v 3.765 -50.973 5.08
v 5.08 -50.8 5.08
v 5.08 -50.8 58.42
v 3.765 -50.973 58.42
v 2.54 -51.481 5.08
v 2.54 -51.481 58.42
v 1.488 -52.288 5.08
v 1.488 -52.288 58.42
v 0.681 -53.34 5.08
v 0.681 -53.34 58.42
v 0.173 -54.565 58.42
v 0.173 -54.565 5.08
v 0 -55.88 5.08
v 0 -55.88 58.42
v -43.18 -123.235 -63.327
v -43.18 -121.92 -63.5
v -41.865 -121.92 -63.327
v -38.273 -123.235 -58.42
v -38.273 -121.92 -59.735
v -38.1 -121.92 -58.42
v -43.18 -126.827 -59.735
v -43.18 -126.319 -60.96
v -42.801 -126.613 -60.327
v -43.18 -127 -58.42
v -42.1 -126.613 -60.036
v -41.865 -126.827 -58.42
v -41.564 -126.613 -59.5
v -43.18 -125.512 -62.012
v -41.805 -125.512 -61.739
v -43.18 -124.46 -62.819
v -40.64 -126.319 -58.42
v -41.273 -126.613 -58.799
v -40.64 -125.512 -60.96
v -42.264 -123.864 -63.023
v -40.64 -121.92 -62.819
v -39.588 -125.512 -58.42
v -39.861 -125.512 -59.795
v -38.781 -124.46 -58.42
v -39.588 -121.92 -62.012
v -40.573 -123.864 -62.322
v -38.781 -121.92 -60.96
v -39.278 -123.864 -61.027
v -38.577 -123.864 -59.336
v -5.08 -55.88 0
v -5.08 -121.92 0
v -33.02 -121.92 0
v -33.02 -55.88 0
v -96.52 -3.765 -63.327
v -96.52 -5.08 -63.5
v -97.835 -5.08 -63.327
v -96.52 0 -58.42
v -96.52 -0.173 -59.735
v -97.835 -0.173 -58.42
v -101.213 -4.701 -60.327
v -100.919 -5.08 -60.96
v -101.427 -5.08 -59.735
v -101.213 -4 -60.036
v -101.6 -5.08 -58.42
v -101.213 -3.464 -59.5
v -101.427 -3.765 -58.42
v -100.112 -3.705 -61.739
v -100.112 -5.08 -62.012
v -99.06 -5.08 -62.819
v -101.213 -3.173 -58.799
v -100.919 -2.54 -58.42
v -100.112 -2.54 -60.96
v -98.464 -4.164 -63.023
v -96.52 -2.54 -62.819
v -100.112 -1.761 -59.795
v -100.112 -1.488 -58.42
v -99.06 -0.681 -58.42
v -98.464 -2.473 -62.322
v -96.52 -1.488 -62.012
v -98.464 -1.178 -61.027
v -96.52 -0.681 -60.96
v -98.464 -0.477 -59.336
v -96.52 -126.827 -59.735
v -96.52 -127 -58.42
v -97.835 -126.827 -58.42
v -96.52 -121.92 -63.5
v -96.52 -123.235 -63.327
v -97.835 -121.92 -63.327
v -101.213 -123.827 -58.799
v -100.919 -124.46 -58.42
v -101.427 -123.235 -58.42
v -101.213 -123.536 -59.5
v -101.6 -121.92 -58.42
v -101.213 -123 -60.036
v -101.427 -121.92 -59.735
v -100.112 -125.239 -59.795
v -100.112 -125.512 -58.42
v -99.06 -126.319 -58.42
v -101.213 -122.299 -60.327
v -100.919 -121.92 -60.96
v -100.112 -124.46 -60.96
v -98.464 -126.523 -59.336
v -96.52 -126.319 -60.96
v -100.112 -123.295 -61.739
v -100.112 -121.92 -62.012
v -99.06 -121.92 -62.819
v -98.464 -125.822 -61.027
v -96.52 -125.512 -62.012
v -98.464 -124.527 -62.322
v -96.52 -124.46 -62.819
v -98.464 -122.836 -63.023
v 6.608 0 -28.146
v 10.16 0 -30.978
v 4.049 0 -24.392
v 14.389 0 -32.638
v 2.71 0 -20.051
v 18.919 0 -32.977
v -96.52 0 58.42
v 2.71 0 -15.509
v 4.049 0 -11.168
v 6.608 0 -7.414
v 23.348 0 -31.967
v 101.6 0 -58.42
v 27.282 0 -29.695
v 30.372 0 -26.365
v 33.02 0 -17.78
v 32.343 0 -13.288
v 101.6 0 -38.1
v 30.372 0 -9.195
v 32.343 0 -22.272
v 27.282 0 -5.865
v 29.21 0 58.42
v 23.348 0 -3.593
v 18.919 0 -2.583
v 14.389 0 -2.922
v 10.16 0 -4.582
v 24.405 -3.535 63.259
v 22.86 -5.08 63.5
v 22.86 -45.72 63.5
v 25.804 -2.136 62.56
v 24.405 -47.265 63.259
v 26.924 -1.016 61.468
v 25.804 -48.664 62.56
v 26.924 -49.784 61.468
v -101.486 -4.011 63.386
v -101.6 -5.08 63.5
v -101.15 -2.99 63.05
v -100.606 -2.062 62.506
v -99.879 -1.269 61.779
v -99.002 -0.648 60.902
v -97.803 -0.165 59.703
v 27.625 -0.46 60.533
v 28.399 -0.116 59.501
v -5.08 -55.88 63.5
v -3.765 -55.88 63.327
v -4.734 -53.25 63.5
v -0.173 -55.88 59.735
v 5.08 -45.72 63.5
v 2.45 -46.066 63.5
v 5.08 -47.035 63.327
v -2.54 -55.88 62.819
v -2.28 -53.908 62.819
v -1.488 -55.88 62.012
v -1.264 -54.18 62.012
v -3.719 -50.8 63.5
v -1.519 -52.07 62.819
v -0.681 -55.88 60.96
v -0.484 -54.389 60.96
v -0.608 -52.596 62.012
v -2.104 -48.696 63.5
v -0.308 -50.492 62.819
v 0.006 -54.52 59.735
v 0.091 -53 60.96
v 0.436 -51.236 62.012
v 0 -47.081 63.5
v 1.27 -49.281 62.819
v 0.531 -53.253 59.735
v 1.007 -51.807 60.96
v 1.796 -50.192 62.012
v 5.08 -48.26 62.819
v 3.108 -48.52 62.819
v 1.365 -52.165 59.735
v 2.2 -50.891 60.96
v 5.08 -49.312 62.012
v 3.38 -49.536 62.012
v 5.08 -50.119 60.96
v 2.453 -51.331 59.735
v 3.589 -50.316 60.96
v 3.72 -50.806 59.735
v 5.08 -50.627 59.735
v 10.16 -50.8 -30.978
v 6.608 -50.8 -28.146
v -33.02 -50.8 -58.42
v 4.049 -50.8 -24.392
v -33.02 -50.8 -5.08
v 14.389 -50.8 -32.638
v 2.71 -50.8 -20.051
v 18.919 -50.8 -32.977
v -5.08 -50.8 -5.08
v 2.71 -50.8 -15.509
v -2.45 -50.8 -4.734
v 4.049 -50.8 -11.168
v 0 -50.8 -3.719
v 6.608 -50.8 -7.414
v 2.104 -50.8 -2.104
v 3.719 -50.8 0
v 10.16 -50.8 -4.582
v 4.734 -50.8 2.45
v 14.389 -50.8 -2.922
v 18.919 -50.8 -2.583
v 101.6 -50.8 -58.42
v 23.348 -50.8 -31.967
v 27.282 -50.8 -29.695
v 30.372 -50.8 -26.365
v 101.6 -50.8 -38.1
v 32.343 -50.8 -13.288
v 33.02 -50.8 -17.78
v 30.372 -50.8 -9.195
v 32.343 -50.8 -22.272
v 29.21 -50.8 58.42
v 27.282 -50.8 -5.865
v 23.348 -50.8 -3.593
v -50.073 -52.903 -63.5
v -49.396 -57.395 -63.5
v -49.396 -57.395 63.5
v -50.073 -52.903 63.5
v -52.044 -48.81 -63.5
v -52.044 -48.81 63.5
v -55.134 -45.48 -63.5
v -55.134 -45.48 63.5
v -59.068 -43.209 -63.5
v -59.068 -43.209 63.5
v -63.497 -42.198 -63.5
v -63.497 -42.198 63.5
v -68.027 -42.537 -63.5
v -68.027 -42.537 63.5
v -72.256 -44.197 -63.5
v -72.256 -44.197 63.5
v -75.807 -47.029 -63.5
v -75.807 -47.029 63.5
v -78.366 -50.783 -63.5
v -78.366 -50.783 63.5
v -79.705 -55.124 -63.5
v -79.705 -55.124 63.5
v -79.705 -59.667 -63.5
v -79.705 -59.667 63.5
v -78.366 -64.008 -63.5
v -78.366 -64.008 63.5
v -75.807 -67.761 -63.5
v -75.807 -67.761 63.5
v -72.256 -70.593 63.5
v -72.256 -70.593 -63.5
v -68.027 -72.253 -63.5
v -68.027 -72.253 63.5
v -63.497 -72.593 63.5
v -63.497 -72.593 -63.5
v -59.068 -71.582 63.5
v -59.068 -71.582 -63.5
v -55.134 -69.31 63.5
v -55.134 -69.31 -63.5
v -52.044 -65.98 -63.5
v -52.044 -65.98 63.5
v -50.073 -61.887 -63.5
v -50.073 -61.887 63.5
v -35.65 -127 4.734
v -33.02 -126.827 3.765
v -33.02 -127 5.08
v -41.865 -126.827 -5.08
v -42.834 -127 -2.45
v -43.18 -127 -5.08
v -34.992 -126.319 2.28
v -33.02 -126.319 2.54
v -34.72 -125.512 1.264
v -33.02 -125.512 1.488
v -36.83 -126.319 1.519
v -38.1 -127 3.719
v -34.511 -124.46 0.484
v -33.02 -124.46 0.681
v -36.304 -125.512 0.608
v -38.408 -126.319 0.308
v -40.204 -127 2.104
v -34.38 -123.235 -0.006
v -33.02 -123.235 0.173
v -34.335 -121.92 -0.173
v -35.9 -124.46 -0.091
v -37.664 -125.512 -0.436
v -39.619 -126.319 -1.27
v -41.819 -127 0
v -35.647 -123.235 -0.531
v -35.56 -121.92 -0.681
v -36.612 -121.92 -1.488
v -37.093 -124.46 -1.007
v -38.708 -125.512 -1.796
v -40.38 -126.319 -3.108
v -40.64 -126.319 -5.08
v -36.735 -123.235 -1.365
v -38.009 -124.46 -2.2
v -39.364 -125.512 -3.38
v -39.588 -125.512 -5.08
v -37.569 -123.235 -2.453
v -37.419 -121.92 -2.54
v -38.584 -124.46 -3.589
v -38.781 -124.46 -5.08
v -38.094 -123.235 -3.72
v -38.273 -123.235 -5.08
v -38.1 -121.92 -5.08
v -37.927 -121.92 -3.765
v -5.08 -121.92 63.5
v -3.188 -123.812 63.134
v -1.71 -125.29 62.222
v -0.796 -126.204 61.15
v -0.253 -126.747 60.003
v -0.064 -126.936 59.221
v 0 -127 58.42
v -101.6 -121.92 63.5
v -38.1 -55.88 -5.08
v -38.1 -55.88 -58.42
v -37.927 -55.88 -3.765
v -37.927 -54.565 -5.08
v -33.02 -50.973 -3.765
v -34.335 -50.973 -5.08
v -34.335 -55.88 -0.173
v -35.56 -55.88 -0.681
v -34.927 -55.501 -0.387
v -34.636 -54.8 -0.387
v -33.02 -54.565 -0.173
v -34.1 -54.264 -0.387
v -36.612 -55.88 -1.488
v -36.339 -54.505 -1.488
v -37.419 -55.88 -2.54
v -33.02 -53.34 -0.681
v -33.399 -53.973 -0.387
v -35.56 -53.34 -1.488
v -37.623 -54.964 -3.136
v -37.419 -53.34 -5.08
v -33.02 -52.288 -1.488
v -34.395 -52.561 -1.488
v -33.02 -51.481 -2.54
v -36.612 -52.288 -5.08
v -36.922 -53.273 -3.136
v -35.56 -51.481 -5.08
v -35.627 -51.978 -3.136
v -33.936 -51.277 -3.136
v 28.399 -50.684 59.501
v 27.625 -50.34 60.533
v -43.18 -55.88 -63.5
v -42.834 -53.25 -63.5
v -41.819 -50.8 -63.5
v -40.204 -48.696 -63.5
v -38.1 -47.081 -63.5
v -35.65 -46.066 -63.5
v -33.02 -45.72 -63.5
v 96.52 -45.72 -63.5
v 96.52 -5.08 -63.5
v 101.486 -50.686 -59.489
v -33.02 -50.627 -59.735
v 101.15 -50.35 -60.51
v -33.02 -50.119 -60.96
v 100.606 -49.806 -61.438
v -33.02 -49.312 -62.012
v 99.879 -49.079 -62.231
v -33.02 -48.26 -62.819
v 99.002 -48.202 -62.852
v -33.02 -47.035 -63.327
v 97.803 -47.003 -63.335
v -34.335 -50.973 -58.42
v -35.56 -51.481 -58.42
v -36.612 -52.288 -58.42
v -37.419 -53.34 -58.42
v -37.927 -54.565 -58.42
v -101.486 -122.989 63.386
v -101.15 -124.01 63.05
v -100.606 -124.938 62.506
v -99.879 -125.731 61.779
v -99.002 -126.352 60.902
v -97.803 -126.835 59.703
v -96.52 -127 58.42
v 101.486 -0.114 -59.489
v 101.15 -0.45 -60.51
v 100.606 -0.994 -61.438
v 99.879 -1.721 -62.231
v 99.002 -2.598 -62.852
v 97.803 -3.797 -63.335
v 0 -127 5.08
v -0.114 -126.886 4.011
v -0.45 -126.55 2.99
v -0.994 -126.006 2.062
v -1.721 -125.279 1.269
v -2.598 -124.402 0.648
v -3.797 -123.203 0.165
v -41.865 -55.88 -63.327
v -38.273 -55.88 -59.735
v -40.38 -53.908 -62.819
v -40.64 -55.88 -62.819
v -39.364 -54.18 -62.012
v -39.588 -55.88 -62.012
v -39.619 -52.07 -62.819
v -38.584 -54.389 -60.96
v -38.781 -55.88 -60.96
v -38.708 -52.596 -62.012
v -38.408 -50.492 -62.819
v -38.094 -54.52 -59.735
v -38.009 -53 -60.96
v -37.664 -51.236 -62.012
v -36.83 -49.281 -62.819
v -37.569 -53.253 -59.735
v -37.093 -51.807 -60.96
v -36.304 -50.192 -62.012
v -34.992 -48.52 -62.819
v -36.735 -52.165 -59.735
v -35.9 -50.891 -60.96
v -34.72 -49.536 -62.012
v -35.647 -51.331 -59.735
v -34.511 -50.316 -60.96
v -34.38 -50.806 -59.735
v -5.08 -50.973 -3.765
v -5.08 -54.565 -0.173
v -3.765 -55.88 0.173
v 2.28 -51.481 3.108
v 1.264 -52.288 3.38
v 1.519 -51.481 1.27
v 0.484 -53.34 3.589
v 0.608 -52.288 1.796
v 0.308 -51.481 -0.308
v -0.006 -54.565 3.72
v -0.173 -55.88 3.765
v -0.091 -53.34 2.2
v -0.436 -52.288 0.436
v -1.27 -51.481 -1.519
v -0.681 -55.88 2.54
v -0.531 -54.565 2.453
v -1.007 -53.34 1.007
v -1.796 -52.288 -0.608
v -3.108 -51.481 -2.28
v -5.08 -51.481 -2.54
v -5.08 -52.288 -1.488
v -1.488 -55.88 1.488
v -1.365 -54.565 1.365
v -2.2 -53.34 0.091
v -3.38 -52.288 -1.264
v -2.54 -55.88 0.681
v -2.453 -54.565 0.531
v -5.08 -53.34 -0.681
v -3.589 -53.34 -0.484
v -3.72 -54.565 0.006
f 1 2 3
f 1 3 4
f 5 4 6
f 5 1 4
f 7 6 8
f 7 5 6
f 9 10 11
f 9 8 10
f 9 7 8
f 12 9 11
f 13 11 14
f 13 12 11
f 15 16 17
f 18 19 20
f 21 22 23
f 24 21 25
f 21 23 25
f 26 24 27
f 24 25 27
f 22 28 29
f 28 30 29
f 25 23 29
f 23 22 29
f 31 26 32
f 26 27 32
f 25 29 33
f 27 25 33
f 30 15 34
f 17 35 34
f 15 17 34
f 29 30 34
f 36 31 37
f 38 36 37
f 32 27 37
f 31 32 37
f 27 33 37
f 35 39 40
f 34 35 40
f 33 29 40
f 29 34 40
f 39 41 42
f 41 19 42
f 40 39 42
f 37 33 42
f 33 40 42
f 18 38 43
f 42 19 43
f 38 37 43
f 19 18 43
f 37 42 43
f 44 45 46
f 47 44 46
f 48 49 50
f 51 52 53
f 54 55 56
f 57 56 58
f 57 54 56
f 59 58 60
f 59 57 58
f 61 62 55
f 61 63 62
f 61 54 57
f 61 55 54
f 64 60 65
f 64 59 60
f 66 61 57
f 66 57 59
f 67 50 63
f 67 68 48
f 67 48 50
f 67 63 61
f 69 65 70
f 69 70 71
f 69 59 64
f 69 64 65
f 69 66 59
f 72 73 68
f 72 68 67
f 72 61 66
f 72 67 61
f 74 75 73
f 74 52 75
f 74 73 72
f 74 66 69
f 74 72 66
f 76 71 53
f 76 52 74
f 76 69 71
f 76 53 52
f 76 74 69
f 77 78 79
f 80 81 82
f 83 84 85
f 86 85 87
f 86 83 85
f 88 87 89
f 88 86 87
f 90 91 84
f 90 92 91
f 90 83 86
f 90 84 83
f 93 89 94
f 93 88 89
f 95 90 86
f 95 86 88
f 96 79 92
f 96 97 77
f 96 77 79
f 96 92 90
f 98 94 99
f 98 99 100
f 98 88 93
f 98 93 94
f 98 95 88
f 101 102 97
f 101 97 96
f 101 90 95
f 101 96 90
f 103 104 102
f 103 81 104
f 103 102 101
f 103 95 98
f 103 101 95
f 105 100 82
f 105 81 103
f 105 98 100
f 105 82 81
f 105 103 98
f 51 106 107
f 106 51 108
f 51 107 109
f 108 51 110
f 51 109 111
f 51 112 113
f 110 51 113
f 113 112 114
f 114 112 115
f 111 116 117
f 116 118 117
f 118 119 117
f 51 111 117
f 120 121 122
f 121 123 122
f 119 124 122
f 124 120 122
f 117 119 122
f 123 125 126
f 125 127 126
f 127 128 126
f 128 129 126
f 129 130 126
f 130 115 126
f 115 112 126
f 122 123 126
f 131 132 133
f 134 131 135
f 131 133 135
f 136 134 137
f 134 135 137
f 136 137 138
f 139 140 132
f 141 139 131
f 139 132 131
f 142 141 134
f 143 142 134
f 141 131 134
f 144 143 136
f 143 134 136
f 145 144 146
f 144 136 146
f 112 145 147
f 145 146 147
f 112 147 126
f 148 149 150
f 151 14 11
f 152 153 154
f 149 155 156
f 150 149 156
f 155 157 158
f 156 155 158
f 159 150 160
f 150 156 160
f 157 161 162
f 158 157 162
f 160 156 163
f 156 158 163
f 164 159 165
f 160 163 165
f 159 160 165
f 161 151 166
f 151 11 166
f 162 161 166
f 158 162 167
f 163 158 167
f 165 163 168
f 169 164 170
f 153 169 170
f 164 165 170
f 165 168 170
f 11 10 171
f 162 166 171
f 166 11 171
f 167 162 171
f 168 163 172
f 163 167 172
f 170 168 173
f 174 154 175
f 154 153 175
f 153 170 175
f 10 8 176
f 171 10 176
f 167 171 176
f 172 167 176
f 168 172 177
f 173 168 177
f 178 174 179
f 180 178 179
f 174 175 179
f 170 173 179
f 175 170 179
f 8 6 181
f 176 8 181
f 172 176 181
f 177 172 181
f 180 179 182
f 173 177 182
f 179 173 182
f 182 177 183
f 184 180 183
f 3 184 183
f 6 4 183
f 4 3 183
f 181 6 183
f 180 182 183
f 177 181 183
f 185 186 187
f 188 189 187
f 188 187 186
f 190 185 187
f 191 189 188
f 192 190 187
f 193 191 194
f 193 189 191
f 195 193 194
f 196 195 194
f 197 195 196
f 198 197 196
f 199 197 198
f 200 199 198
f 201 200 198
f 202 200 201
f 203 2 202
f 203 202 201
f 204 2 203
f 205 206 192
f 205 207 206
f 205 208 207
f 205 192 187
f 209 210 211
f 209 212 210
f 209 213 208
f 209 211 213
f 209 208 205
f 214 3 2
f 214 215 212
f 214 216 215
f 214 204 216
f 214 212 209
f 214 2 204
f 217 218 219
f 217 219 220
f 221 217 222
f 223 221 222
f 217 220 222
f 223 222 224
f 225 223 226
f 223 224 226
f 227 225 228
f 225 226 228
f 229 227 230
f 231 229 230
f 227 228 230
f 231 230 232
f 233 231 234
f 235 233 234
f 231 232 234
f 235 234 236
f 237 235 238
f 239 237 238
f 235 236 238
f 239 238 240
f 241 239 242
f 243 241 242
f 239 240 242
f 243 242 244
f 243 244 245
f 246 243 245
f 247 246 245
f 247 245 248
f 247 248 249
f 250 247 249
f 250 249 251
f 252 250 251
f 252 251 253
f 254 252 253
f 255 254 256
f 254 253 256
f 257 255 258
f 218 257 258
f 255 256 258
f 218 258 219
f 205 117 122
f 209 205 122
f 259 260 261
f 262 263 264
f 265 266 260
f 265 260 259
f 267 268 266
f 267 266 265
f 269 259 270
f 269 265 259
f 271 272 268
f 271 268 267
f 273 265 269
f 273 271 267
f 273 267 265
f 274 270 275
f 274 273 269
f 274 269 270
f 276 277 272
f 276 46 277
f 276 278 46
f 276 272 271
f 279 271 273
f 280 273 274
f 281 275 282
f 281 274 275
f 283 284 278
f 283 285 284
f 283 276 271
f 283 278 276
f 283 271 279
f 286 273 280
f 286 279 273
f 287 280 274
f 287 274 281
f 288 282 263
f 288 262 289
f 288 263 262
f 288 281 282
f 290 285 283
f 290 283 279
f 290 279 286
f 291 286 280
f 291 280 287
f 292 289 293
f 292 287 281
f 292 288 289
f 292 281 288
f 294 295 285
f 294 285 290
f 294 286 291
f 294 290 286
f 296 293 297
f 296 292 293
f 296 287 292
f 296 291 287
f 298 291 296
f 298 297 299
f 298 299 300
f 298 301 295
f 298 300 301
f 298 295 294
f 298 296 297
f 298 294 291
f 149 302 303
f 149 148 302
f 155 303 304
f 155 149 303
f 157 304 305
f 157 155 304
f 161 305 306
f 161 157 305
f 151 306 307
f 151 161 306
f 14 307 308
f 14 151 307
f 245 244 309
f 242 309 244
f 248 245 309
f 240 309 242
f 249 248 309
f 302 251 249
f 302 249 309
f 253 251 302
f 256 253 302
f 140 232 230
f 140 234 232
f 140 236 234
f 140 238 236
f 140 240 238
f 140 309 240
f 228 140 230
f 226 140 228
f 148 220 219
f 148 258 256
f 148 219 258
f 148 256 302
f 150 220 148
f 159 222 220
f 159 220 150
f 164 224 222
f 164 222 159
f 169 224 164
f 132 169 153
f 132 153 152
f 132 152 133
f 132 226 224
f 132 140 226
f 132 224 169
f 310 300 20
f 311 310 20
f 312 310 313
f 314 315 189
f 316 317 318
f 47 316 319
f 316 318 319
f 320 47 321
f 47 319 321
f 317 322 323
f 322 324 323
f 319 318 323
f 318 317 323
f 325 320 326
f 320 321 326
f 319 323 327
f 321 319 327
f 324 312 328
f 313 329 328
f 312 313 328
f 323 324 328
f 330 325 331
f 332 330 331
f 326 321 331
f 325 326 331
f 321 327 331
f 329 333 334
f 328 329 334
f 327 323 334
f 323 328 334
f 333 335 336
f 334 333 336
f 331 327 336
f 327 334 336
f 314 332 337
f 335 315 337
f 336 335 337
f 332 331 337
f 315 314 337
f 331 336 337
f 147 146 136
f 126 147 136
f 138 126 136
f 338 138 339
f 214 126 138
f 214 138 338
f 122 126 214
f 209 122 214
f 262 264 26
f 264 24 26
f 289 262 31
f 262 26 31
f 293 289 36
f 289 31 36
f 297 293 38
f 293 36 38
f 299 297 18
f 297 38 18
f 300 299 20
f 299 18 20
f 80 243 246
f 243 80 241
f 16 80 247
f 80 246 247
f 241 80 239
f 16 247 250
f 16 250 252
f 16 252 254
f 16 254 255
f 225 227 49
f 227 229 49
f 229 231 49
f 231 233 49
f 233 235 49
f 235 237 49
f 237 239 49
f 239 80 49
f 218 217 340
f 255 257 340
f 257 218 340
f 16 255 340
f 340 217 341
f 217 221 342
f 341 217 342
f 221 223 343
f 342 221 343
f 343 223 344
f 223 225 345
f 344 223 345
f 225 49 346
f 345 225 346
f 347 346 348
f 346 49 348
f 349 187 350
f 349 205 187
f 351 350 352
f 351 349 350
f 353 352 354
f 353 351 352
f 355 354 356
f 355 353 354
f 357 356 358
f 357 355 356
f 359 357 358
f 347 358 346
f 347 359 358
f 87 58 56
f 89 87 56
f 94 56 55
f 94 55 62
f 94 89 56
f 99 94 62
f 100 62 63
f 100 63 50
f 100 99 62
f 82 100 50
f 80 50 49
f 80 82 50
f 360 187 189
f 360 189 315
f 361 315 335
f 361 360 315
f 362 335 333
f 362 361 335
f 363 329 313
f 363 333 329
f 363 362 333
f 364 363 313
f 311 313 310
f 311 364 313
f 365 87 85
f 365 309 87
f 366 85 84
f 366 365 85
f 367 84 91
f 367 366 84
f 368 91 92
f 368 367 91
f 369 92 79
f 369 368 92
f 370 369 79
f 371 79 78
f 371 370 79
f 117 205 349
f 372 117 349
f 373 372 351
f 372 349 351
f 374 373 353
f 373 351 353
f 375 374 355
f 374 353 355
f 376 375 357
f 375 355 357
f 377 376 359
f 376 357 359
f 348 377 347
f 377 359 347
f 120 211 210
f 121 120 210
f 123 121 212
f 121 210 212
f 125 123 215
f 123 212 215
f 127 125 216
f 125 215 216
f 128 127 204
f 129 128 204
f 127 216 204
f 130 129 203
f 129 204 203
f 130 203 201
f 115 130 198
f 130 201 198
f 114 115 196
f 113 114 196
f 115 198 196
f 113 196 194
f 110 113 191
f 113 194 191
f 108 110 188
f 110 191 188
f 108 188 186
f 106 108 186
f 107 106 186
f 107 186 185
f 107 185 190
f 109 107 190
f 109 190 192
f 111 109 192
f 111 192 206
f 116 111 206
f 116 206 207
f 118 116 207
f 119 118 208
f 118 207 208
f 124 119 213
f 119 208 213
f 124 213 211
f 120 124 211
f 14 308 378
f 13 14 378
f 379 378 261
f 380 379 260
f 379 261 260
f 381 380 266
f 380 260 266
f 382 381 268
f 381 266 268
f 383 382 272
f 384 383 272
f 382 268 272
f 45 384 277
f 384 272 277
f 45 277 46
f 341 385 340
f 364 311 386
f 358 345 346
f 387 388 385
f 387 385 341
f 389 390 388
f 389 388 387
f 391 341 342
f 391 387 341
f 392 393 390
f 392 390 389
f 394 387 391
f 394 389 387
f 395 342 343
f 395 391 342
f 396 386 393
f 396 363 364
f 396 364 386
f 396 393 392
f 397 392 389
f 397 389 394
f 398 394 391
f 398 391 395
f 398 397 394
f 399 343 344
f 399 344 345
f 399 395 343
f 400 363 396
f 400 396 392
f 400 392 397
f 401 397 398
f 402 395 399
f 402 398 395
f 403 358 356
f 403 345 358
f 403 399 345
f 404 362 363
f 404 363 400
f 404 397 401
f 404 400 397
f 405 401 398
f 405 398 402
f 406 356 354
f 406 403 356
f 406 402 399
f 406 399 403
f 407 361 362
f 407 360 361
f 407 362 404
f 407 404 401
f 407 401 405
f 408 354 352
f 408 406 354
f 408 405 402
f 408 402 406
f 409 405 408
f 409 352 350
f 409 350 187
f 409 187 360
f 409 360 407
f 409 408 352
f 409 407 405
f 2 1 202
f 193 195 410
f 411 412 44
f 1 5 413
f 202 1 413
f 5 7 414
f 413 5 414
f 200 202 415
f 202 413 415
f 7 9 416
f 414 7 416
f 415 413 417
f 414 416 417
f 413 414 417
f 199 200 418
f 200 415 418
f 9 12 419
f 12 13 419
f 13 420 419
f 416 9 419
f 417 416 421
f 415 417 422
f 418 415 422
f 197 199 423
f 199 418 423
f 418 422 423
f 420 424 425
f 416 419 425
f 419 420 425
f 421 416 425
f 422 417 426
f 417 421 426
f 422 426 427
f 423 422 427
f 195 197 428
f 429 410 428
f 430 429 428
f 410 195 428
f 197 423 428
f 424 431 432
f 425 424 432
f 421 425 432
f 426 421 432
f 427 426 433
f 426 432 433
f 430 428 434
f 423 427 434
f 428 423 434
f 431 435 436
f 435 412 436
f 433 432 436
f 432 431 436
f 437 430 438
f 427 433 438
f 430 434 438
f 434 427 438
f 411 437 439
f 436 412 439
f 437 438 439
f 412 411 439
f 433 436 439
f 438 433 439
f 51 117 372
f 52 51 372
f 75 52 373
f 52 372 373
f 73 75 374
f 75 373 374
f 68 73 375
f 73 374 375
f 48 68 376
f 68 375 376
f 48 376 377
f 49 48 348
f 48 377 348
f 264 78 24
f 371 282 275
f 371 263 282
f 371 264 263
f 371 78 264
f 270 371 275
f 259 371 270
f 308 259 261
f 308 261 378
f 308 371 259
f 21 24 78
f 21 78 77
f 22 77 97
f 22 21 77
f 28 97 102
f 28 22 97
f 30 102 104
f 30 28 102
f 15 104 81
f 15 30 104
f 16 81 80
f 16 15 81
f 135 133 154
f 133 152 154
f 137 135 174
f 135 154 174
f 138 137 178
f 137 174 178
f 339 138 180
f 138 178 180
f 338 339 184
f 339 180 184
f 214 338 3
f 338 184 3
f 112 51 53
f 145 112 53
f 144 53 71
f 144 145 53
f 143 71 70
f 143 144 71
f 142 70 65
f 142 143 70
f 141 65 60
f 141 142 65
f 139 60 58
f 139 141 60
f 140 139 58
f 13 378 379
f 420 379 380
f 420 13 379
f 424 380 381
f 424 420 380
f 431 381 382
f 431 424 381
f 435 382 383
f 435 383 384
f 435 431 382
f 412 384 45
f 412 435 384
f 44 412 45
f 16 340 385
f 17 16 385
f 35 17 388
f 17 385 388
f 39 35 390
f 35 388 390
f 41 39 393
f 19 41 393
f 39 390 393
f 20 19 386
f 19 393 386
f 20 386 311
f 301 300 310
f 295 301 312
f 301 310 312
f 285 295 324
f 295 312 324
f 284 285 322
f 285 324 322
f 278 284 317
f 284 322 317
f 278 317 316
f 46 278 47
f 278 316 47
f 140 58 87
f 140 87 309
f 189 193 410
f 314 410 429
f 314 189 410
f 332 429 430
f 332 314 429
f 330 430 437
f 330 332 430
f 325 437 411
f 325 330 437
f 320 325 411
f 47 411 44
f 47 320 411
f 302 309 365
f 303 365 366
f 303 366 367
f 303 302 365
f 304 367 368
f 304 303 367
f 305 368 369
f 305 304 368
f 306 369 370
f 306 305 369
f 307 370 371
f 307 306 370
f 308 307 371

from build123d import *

# Parameters (mm, degrees)
F0_W     = 203.2
F0_H     = 127
F1_DEPTH = 127
F3_DEPTH = 76.2
F4_SIZE2 = 101.6
F4_SIZE  = 76.2
F5_R     = 5.08
F6_R     = 15.24
F7_DEPTH = 50.8
F8_R     = 15.24
F9_DEPTH = 127


with BuildPart() as f1:
    # F0 (on Front) → F1 (new body)
    with BuildSketch(Plane.XZ):
        Rectangle(F0_W, F0_H)
    extrude(amount=F1_DEPTH)

    # F2 (on face) → F3 (cut)
    with BuildSketch(Plane.XZ.offset(127)):
        Polygon((-38.1, 0), (-38.1, -63.5), (101.6, -63.5), (101.6, 63.5), (0, 63.5), (0, 0), align=None)
    extrude(amount=-F3_DEPTH, mode=Mode.SUBTRACT)

    # F4
    f4_edges = [f1.edges().sort_by_distance(p)[0] for p in [
        (101.6, -25.4, 63.5),
    ]]
    f4_side = f1.faces().sort_by_distance((-21.771429, -52.614286, 63.5))[0]
    chamfer(f4_edges, length=F4_SIZE, length2=F4_SIZE2, reference=f4_side)

    # F5
    f5_edges = [f1.edges().sort_by_distance(p)[0] for p in [
        (-50.8, -127, 63.5),
        (-19.05, -127, 0),
        (0, -88.9, 63.5),
        (0, -88.9, 0),
        (12.7, -50.8, 63.5),
        (25.4, -25.4, 63.5),
        (-38.1, 0, 63.5),
        (-38.1, -88.9, -63.5),
        (-69.85, -127, -63.5),
        (-38.1, -127, -31.75),
        (-101.6, -127, 0),
        (31.75, -50.8, -63.5),
        (101.6, -25.4, -63.5),
        (-38.1, -50.8, -31.75),
        (0, -50.8, 31.75),
        (-38.1, -88.9, 0),
        (0, 0, -63.5),
        (-101.6, -63.5, -63.5),
        (-101.6, 0, 0),
        (-19.05, -50.8, 0),
    ]]
    fillet(f5_edges, radius=F5_R)

    # F6 (on face) → F7 (cut, through all)
    with BuildSketch(Plane.XZ.offset(50.8)):
        with Locations((17.78, -17.78)):
            Circle(F6_R)
    extrude(amount=-F7_DEPTH, mode=Mode.SUBTRACT)

    # F8 (on face) → F9 (cut, through all)
    with BuildSketch(Plane.XY.offset(63.5)):
        with Locations((-64.6355301142, -57.3951564729)):
            Circle(F8_R)
    extrude(amount=-F9_DEPTH, mode=Mode.SUBTRACT)


solid = f1.part
